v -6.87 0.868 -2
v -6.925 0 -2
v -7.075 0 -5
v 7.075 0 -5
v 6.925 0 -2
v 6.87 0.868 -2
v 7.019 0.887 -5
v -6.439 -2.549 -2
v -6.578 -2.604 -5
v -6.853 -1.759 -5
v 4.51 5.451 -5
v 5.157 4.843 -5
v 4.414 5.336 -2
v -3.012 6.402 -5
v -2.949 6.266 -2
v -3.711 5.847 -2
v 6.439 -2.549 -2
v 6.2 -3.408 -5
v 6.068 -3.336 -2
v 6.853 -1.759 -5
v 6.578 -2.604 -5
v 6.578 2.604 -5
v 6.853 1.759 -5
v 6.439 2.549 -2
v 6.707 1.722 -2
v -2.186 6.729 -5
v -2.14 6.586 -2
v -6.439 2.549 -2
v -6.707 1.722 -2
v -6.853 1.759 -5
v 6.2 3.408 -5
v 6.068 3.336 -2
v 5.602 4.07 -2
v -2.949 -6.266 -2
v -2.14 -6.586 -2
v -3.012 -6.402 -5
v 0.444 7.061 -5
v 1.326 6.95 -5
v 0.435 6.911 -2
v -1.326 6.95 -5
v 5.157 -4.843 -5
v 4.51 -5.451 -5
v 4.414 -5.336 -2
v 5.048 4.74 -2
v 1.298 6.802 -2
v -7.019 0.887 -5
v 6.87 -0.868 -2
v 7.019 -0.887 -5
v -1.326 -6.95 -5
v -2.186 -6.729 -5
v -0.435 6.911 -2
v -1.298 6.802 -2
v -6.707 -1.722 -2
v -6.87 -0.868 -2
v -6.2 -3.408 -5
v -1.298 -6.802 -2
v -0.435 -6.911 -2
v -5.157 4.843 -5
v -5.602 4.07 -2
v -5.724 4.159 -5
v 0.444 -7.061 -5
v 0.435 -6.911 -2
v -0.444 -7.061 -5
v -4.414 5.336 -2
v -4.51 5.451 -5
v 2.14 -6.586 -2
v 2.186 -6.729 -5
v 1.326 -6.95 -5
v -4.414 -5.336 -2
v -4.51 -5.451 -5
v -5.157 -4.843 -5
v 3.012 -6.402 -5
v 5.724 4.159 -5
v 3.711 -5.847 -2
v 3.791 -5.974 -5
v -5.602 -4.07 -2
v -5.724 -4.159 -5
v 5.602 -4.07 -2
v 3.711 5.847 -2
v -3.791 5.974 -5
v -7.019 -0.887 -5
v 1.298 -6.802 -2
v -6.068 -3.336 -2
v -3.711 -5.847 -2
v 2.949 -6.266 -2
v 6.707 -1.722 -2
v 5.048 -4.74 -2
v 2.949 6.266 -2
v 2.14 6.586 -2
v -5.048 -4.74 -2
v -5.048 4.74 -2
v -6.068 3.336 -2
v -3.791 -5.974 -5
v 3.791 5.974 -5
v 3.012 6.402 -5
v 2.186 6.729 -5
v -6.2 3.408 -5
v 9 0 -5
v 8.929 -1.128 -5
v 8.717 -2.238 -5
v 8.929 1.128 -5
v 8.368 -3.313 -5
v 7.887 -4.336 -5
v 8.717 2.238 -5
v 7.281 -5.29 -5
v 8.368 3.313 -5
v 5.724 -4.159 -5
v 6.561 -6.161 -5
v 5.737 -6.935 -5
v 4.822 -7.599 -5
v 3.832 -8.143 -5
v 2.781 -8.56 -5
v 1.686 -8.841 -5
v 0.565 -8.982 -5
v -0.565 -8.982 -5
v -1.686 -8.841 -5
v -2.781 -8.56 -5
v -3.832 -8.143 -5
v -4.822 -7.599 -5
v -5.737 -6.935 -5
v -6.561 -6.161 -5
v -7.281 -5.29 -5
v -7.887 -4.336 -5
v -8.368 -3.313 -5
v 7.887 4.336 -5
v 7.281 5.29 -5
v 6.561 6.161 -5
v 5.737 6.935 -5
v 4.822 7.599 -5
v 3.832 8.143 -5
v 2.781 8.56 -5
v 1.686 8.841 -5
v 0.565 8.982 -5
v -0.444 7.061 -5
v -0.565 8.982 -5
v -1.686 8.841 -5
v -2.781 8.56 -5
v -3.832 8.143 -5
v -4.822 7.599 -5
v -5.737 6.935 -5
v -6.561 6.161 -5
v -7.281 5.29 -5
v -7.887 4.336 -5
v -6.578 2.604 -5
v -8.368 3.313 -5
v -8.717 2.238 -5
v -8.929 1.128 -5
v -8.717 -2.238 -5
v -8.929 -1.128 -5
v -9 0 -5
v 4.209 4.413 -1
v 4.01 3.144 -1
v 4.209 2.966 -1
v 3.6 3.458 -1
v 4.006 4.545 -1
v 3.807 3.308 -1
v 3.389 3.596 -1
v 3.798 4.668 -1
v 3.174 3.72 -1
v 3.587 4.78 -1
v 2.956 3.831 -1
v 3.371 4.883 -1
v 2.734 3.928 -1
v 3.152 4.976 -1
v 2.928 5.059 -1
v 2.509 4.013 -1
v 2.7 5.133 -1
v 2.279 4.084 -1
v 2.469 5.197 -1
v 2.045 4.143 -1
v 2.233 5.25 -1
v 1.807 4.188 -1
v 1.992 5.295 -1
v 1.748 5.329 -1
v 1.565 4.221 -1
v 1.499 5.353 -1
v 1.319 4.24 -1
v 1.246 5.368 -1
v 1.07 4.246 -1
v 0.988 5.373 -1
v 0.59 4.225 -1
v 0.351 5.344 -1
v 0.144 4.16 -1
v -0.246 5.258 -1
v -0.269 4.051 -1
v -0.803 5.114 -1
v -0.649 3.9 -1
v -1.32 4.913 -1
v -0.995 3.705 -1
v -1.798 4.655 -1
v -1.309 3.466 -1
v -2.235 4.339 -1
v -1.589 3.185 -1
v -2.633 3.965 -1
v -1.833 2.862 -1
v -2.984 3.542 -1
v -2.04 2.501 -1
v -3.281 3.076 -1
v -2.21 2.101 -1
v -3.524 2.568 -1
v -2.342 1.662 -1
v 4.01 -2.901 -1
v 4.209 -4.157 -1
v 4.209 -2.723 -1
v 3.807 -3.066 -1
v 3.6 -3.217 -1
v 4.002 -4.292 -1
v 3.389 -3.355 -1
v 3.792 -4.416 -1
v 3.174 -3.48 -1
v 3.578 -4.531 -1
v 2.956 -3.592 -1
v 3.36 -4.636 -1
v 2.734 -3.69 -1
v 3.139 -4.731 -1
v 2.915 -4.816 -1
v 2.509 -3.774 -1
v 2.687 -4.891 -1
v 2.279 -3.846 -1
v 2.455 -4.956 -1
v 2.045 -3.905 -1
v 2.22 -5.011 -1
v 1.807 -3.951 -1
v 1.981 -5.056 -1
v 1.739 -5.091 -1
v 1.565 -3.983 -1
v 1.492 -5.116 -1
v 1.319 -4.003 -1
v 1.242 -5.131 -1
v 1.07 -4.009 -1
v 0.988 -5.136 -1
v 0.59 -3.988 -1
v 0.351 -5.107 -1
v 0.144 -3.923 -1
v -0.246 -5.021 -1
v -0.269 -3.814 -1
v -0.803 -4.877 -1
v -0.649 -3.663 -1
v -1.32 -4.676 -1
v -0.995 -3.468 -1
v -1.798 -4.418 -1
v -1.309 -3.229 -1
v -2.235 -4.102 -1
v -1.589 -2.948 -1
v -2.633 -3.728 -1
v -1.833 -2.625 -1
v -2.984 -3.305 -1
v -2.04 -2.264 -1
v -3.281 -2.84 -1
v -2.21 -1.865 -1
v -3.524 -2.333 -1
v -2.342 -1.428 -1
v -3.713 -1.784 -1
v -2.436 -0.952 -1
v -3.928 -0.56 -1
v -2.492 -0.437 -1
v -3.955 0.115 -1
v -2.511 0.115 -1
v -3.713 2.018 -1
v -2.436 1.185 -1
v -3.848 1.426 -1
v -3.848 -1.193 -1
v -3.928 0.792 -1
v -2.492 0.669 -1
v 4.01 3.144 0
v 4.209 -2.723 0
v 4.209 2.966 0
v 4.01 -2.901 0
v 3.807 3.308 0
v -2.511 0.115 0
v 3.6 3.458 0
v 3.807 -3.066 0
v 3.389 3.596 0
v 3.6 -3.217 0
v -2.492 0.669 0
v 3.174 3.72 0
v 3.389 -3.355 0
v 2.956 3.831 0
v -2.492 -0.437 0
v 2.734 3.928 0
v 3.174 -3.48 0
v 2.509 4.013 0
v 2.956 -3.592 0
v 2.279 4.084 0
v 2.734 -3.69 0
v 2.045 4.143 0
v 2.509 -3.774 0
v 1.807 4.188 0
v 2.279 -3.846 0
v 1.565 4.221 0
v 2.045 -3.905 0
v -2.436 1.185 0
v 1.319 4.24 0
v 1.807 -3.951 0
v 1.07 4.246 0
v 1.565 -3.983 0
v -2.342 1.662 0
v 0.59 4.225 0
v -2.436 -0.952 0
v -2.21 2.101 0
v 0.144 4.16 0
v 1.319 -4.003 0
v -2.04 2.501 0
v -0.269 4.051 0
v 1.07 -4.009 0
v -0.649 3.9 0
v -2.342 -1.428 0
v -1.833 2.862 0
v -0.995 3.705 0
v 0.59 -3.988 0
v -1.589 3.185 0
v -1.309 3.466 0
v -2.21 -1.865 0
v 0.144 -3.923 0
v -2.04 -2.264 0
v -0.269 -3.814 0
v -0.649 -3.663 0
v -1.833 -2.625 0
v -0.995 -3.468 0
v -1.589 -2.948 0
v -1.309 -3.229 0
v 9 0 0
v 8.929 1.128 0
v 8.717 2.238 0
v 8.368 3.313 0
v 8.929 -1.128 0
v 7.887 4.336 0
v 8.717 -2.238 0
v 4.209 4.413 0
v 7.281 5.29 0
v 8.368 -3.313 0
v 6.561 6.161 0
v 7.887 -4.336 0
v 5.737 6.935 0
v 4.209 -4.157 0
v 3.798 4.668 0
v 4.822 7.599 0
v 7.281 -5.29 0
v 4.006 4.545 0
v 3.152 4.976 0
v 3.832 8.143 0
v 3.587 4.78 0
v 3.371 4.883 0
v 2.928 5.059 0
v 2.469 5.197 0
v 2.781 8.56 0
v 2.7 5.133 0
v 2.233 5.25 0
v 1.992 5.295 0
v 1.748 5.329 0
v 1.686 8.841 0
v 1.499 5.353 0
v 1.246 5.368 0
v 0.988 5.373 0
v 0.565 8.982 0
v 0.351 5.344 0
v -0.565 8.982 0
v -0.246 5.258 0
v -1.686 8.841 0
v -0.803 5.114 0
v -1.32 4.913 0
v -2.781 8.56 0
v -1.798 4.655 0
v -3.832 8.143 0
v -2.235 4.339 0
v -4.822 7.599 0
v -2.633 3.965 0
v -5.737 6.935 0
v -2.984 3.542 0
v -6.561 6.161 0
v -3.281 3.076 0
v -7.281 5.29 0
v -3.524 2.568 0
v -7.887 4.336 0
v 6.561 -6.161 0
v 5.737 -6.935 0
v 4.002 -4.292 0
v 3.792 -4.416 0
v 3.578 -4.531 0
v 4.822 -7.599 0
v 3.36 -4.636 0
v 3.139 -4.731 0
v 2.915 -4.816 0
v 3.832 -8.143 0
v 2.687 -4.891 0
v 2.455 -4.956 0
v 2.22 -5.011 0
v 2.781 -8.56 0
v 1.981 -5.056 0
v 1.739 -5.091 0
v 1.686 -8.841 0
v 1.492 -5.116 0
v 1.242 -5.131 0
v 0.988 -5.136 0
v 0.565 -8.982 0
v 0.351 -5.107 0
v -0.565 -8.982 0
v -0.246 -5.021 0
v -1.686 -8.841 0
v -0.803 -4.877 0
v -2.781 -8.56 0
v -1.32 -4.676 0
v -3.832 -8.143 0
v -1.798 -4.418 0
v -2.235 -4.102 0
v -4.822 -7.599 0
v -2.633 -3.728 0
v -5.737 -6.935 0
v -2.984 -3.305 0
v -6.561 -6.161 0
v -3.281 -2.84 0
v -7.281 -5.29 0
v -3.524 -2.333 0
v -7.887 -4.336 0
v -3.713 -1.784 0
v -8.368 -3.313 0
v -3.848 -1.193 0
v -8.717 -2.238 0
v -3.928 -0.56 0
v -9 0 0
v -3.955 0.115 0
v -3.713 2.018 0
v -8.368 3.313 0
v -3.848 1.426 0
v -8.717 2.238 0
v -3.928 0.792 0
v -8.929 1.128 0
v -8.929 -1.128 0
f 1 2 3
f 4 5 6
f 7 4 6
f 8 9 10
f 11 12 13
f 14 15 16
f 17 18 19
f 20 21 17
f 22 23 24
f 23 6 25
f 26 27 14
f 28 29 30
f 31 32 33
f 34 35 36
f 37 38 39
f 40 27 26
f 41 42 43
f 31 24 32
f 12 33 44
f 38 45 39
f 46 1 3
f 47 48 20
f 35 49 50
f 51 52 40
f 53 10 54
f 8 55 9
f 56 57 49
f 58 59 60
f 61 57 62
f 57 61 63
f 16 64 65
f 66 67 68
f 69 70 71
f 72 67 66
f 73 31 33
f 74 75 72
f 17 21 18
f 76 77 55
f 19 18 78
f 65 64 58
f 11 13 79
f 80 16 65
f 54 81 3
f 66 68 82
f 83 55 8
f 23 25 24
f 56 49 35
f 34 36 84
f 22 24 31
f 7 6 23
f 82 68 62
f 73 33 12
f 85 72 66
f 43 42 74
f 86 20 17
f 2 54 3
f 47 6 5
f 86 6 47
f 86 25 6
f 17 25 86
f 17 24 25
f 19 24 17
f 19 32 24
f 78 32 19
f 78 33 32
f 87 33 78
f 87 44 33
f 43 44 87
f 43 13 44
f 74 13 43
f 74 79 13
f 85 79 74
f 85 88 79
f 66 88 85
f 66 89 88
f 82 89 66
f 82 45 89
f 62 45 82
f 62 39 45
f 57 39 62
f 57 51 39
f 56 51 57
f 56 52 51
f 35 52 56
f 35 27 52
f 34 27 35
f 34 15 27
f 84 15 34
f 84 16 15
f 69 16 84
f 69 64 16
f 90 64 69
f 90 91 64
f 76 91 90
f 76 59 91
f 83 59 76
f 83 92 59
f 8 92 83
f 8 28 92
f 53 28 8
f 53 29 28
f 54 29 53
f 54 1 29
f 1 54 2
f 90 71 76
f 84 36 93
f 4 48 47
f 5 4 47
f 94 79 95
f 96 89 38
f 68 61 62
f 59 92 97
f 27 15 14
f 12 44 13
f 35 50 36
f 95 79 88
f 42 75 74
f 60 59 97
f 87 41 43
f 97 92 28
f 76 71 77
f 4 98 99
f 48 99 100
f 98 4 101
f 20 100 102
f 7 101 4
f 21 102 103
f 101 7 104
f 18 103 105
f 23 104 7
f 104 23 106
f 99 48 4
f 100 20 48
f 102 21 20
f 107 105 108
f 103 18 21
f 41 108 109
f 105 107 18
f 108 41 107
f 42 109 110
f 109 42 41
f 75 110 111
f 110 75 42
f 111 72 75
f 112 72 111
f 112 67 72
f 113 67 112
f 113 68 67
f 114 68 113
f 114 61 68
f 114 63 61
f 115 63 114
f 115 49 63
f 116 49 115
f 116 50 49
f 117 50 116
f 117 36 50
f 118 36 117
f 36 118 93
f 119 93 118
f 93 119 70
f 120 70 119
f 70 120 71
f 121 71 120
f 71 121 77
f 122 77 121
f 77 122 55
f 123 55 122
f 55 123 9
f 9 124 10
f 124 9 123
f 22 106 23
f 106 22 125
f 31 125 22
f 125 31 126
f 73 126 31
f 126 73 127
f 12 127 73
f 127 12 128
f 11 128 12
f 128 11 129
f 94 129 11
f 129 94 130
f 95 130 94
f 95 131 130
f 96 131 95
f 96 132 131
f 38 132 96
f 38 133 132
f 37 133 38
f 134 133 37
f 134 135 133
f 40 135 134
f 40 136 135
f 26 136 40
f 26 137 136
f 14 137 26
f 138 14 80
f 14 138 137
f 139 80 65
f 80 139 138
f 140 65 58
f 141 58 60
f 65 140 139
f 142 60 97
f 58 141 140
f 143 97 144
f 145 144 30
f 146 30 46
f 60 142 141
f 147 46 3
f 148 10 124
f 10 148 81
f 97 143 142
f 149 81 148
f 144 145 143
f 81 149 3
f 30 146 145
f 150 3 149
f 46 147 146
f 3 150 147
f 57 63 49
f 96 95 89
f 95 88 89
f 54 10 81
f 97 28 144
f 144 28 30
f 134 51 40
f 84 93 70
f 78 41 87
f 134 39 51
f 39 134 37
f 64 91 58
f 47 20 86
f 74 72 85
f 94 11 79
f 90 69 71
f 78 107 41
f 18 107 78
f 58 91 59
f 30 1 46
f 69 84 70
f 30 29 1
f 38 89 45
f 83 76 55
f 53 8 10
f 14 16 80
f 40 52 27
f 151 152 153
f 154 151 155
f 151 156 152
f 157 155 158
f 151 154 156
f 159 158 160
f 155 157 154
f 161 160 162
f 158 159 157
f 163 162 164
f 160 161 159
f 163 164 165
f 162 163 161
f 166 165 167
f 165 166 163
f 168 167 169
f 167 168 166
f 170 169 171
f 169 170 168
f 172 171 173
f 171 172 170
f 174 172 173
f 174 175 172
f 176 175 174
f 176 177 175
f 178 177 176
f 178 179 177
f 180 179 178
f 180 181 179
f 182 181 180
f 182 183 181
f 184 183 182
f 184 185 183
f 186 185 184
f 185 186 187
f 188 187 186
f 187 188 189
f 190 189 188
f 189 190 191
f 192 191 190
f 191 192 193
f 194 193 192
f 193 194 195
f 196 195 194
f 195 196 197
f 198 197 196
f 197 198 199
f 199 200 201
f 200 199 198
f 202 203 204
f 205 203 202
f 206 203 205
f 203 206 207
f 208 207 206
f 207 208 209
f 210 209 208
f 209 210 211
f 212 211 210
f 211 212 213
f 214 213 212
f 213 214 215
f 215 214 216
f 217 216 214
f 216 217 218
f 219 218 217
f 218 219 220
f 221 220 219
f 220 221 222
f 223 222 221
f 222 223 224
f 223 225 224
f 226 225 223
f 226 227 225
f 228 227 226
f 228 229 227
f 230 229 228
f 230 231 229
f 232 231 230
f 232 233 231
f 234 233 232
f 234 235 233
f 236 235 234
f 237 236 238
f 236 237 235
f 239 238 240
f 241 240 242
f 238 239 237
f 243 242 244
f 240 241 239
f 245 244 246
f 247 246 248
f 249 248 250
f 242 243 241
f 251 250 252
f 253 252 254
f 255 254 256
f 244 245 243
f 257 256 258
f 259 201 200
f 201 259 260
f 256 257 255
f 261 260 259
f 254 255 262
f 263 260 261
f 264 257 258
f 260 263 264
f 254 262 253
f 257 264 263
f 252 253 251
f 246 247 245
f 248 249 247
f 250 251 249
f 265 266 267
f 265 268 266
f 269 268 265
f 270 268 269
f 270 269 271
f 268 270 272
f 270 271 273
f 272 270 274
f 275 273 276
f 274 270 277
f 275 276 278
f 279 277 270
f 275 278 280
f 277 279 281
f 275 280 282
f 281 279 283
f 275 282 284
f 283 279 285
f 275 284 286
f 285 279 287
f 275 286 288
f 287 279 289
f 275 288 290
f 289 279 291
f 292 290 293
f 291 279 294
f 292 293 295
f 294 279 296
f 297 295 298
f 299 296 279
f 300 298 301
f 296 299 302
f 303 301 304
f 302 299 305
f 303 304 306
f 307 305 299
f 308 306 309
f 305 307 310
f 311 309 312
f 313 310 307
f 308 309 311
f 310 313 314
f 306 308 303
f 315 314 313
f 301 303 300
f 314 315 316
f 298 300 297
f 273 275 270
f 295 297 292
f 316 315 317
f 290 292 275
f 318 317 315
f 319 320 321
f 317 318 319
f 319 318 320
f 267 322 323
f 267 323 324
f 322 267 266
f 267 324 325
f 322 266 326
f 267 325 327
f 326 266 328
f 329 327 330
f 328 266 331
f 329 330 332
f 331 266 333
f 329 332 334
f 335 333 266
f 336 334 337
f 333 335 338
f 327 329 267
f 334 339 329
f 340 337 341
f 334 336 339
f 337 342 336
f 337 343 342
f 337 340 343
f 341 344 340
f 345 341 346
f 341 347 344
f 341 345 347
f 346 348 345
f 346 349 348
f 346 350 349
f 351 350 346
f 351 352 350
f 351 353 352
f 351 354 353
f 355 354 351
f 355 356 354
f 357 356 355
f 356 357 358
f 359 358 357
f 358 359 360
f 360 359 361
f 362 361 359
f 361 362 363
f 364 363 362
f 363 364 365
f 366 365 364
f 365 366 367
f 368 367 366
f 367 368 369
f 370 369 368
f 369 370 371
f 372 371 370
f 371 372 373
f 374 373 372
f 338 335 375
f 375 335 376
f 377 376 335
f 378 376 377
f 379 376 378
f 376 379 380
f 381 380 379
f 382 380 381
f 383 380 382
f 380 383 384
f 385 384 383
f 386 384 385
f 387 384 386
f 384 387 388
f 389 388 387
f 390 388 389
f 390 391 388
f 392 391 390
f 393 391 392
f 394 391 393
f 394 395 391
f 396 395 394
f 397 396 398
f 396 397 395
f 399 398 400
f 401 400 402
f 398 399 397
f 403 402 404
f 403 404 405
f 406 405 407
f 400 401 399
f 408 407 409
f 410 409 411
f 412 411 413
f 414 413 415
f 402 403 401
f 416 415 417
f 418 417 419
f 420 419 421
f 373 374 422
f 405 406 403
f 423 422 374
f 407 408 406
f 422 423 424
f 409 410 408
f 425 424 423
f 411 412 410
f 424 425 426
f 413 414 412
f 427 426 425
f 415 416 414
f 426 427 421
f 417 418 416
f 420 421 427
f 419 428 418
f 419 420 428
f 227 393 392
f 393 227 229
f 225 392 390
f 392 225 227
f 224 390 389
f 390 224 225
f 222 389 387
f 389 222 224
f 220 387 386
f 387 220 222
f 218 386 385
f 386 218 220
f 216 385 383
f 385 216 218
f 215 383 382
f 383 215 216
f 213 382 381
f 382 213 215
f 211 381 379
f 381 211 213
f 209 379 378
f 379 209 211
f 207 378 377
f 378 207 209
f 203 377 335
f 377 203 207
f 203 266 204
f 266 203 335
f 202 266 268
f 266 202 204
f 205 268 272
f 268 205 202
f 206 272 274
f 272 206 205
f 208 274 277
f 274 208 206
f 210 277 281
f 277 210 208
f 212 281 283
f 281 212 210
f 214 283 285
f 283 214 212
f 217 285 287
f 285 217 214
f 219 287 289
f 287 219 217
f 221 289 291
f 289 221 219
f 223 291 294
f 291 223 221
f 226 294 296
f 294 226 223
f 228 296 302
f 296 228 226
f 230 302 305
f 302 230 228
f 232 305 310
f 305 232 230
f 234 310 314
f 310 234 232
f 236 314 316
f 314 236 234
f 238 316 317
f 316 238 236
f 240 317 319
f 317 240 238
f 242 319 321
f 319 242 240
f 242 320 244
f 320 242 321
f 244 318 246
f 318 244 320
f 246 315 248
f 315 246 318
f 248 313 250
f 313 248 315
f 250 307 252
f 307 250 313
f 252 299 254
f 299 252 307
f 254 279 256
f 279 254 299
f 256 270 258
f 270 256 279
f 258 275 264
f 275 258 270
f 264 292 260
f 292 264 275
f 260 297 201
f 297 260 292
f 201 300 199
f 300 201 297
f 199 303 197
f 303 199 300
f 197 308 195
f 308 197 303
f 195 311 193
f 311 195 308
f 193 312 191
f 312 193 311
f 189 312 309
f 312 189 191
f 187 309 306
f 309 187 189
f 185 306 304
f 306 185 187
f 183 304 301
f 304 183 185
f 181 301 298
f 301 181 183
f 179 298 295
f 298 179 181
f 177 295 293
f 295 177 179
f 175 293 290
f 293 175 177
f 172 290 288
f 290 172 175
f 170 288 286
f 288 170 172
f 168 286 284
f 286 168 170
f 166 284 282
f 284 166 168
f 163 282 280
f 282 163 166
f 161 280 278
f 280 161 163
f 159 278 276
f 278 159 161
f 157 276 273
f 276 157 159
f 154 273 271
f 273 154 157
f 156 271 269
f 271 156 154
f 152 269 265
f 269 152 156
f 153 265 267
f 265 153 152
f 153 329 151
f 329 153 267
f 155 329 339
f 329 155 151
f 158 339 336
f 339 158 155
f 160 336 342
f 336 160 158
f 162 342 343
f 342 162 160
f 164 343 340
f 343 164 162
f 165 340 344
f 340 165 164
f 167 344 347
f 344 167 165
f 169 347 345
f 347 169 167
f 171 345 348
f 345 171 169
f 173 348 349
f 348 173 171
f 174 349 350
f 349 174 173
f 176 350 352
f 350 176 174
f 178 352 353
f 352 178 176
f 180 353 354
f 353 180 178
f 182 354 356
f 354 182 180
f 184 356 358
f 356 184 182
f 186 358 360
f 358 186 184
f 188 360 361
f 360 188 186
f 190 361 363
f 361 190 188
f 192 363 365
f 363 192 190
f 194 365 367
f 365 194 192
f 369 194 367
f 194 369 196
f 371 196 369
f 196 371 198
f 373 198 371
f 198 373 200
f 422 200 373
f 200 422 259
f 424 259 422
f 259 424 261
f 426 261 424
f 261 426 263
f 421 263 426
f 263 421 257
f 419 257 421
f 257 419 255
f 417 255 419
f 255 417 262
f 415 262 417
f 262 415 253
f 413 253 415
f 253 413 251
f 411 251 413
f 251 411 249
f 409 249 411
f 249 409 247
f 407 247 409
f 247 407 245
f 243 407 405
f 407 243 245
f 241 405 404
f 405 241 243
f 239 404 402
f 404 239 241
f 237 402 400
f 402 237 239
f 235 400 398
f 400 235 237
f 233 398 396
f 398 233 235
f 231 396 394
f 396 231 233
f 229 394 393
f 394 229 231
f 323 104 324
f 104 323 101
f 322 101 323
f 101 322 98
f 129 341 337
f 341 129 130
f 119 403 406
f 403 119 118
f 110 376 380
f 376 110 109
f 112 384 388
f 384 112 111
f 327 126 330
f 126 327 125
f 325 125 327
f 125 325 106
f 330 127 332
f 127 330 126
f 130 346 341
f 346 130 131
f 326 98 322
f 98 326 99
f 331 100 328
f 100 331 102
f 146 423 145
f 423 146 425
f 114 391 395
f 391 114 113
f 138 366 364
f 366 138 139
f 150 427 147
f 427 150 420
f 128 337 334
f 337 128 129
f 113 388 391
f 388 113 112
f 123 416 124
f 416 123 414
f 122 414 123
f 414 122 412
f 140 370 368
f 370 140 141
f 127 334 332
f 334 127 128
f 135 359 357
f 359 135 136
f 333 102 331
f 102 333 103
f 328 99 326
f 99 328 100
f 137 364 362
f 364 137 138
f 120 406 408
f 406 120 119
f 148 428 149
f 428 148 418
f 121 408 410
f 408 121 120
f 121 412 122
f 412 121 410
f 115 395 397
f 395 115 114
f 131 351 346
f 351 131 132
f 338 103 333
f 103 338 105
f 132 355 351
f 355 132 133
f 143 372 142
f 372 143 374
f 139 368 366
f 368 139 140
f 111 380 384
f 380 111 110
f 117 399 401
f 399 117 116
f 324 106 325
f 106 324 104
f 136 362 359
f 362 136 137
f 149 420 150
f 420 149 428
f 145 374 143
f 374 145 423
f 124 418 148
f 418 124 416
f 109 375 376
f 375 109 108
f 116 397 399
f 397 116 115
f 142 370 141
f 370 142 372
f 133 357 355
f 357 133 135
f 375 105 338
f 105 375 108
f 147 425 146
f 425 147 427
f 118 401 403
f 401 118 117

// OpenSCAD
$fn = 50;

difference() {
	union() {
		translate(v = [0, 0, -5.0]) {
			cylinder(h = 5, r = 9.0);
		}
	}
	union() {
		#translate(v = [0, 0, -5.0]) {
			cylinder(h = 3, r1 = 7.075, r2 = 6.925);
		}
		translate(v = [0, 0, -1]) {
			linear_extrude(height = 1) {
				text(font = "Impact", halign = "center", size = 10, text = "C", valign = "center");
			}
		}
	}
}
